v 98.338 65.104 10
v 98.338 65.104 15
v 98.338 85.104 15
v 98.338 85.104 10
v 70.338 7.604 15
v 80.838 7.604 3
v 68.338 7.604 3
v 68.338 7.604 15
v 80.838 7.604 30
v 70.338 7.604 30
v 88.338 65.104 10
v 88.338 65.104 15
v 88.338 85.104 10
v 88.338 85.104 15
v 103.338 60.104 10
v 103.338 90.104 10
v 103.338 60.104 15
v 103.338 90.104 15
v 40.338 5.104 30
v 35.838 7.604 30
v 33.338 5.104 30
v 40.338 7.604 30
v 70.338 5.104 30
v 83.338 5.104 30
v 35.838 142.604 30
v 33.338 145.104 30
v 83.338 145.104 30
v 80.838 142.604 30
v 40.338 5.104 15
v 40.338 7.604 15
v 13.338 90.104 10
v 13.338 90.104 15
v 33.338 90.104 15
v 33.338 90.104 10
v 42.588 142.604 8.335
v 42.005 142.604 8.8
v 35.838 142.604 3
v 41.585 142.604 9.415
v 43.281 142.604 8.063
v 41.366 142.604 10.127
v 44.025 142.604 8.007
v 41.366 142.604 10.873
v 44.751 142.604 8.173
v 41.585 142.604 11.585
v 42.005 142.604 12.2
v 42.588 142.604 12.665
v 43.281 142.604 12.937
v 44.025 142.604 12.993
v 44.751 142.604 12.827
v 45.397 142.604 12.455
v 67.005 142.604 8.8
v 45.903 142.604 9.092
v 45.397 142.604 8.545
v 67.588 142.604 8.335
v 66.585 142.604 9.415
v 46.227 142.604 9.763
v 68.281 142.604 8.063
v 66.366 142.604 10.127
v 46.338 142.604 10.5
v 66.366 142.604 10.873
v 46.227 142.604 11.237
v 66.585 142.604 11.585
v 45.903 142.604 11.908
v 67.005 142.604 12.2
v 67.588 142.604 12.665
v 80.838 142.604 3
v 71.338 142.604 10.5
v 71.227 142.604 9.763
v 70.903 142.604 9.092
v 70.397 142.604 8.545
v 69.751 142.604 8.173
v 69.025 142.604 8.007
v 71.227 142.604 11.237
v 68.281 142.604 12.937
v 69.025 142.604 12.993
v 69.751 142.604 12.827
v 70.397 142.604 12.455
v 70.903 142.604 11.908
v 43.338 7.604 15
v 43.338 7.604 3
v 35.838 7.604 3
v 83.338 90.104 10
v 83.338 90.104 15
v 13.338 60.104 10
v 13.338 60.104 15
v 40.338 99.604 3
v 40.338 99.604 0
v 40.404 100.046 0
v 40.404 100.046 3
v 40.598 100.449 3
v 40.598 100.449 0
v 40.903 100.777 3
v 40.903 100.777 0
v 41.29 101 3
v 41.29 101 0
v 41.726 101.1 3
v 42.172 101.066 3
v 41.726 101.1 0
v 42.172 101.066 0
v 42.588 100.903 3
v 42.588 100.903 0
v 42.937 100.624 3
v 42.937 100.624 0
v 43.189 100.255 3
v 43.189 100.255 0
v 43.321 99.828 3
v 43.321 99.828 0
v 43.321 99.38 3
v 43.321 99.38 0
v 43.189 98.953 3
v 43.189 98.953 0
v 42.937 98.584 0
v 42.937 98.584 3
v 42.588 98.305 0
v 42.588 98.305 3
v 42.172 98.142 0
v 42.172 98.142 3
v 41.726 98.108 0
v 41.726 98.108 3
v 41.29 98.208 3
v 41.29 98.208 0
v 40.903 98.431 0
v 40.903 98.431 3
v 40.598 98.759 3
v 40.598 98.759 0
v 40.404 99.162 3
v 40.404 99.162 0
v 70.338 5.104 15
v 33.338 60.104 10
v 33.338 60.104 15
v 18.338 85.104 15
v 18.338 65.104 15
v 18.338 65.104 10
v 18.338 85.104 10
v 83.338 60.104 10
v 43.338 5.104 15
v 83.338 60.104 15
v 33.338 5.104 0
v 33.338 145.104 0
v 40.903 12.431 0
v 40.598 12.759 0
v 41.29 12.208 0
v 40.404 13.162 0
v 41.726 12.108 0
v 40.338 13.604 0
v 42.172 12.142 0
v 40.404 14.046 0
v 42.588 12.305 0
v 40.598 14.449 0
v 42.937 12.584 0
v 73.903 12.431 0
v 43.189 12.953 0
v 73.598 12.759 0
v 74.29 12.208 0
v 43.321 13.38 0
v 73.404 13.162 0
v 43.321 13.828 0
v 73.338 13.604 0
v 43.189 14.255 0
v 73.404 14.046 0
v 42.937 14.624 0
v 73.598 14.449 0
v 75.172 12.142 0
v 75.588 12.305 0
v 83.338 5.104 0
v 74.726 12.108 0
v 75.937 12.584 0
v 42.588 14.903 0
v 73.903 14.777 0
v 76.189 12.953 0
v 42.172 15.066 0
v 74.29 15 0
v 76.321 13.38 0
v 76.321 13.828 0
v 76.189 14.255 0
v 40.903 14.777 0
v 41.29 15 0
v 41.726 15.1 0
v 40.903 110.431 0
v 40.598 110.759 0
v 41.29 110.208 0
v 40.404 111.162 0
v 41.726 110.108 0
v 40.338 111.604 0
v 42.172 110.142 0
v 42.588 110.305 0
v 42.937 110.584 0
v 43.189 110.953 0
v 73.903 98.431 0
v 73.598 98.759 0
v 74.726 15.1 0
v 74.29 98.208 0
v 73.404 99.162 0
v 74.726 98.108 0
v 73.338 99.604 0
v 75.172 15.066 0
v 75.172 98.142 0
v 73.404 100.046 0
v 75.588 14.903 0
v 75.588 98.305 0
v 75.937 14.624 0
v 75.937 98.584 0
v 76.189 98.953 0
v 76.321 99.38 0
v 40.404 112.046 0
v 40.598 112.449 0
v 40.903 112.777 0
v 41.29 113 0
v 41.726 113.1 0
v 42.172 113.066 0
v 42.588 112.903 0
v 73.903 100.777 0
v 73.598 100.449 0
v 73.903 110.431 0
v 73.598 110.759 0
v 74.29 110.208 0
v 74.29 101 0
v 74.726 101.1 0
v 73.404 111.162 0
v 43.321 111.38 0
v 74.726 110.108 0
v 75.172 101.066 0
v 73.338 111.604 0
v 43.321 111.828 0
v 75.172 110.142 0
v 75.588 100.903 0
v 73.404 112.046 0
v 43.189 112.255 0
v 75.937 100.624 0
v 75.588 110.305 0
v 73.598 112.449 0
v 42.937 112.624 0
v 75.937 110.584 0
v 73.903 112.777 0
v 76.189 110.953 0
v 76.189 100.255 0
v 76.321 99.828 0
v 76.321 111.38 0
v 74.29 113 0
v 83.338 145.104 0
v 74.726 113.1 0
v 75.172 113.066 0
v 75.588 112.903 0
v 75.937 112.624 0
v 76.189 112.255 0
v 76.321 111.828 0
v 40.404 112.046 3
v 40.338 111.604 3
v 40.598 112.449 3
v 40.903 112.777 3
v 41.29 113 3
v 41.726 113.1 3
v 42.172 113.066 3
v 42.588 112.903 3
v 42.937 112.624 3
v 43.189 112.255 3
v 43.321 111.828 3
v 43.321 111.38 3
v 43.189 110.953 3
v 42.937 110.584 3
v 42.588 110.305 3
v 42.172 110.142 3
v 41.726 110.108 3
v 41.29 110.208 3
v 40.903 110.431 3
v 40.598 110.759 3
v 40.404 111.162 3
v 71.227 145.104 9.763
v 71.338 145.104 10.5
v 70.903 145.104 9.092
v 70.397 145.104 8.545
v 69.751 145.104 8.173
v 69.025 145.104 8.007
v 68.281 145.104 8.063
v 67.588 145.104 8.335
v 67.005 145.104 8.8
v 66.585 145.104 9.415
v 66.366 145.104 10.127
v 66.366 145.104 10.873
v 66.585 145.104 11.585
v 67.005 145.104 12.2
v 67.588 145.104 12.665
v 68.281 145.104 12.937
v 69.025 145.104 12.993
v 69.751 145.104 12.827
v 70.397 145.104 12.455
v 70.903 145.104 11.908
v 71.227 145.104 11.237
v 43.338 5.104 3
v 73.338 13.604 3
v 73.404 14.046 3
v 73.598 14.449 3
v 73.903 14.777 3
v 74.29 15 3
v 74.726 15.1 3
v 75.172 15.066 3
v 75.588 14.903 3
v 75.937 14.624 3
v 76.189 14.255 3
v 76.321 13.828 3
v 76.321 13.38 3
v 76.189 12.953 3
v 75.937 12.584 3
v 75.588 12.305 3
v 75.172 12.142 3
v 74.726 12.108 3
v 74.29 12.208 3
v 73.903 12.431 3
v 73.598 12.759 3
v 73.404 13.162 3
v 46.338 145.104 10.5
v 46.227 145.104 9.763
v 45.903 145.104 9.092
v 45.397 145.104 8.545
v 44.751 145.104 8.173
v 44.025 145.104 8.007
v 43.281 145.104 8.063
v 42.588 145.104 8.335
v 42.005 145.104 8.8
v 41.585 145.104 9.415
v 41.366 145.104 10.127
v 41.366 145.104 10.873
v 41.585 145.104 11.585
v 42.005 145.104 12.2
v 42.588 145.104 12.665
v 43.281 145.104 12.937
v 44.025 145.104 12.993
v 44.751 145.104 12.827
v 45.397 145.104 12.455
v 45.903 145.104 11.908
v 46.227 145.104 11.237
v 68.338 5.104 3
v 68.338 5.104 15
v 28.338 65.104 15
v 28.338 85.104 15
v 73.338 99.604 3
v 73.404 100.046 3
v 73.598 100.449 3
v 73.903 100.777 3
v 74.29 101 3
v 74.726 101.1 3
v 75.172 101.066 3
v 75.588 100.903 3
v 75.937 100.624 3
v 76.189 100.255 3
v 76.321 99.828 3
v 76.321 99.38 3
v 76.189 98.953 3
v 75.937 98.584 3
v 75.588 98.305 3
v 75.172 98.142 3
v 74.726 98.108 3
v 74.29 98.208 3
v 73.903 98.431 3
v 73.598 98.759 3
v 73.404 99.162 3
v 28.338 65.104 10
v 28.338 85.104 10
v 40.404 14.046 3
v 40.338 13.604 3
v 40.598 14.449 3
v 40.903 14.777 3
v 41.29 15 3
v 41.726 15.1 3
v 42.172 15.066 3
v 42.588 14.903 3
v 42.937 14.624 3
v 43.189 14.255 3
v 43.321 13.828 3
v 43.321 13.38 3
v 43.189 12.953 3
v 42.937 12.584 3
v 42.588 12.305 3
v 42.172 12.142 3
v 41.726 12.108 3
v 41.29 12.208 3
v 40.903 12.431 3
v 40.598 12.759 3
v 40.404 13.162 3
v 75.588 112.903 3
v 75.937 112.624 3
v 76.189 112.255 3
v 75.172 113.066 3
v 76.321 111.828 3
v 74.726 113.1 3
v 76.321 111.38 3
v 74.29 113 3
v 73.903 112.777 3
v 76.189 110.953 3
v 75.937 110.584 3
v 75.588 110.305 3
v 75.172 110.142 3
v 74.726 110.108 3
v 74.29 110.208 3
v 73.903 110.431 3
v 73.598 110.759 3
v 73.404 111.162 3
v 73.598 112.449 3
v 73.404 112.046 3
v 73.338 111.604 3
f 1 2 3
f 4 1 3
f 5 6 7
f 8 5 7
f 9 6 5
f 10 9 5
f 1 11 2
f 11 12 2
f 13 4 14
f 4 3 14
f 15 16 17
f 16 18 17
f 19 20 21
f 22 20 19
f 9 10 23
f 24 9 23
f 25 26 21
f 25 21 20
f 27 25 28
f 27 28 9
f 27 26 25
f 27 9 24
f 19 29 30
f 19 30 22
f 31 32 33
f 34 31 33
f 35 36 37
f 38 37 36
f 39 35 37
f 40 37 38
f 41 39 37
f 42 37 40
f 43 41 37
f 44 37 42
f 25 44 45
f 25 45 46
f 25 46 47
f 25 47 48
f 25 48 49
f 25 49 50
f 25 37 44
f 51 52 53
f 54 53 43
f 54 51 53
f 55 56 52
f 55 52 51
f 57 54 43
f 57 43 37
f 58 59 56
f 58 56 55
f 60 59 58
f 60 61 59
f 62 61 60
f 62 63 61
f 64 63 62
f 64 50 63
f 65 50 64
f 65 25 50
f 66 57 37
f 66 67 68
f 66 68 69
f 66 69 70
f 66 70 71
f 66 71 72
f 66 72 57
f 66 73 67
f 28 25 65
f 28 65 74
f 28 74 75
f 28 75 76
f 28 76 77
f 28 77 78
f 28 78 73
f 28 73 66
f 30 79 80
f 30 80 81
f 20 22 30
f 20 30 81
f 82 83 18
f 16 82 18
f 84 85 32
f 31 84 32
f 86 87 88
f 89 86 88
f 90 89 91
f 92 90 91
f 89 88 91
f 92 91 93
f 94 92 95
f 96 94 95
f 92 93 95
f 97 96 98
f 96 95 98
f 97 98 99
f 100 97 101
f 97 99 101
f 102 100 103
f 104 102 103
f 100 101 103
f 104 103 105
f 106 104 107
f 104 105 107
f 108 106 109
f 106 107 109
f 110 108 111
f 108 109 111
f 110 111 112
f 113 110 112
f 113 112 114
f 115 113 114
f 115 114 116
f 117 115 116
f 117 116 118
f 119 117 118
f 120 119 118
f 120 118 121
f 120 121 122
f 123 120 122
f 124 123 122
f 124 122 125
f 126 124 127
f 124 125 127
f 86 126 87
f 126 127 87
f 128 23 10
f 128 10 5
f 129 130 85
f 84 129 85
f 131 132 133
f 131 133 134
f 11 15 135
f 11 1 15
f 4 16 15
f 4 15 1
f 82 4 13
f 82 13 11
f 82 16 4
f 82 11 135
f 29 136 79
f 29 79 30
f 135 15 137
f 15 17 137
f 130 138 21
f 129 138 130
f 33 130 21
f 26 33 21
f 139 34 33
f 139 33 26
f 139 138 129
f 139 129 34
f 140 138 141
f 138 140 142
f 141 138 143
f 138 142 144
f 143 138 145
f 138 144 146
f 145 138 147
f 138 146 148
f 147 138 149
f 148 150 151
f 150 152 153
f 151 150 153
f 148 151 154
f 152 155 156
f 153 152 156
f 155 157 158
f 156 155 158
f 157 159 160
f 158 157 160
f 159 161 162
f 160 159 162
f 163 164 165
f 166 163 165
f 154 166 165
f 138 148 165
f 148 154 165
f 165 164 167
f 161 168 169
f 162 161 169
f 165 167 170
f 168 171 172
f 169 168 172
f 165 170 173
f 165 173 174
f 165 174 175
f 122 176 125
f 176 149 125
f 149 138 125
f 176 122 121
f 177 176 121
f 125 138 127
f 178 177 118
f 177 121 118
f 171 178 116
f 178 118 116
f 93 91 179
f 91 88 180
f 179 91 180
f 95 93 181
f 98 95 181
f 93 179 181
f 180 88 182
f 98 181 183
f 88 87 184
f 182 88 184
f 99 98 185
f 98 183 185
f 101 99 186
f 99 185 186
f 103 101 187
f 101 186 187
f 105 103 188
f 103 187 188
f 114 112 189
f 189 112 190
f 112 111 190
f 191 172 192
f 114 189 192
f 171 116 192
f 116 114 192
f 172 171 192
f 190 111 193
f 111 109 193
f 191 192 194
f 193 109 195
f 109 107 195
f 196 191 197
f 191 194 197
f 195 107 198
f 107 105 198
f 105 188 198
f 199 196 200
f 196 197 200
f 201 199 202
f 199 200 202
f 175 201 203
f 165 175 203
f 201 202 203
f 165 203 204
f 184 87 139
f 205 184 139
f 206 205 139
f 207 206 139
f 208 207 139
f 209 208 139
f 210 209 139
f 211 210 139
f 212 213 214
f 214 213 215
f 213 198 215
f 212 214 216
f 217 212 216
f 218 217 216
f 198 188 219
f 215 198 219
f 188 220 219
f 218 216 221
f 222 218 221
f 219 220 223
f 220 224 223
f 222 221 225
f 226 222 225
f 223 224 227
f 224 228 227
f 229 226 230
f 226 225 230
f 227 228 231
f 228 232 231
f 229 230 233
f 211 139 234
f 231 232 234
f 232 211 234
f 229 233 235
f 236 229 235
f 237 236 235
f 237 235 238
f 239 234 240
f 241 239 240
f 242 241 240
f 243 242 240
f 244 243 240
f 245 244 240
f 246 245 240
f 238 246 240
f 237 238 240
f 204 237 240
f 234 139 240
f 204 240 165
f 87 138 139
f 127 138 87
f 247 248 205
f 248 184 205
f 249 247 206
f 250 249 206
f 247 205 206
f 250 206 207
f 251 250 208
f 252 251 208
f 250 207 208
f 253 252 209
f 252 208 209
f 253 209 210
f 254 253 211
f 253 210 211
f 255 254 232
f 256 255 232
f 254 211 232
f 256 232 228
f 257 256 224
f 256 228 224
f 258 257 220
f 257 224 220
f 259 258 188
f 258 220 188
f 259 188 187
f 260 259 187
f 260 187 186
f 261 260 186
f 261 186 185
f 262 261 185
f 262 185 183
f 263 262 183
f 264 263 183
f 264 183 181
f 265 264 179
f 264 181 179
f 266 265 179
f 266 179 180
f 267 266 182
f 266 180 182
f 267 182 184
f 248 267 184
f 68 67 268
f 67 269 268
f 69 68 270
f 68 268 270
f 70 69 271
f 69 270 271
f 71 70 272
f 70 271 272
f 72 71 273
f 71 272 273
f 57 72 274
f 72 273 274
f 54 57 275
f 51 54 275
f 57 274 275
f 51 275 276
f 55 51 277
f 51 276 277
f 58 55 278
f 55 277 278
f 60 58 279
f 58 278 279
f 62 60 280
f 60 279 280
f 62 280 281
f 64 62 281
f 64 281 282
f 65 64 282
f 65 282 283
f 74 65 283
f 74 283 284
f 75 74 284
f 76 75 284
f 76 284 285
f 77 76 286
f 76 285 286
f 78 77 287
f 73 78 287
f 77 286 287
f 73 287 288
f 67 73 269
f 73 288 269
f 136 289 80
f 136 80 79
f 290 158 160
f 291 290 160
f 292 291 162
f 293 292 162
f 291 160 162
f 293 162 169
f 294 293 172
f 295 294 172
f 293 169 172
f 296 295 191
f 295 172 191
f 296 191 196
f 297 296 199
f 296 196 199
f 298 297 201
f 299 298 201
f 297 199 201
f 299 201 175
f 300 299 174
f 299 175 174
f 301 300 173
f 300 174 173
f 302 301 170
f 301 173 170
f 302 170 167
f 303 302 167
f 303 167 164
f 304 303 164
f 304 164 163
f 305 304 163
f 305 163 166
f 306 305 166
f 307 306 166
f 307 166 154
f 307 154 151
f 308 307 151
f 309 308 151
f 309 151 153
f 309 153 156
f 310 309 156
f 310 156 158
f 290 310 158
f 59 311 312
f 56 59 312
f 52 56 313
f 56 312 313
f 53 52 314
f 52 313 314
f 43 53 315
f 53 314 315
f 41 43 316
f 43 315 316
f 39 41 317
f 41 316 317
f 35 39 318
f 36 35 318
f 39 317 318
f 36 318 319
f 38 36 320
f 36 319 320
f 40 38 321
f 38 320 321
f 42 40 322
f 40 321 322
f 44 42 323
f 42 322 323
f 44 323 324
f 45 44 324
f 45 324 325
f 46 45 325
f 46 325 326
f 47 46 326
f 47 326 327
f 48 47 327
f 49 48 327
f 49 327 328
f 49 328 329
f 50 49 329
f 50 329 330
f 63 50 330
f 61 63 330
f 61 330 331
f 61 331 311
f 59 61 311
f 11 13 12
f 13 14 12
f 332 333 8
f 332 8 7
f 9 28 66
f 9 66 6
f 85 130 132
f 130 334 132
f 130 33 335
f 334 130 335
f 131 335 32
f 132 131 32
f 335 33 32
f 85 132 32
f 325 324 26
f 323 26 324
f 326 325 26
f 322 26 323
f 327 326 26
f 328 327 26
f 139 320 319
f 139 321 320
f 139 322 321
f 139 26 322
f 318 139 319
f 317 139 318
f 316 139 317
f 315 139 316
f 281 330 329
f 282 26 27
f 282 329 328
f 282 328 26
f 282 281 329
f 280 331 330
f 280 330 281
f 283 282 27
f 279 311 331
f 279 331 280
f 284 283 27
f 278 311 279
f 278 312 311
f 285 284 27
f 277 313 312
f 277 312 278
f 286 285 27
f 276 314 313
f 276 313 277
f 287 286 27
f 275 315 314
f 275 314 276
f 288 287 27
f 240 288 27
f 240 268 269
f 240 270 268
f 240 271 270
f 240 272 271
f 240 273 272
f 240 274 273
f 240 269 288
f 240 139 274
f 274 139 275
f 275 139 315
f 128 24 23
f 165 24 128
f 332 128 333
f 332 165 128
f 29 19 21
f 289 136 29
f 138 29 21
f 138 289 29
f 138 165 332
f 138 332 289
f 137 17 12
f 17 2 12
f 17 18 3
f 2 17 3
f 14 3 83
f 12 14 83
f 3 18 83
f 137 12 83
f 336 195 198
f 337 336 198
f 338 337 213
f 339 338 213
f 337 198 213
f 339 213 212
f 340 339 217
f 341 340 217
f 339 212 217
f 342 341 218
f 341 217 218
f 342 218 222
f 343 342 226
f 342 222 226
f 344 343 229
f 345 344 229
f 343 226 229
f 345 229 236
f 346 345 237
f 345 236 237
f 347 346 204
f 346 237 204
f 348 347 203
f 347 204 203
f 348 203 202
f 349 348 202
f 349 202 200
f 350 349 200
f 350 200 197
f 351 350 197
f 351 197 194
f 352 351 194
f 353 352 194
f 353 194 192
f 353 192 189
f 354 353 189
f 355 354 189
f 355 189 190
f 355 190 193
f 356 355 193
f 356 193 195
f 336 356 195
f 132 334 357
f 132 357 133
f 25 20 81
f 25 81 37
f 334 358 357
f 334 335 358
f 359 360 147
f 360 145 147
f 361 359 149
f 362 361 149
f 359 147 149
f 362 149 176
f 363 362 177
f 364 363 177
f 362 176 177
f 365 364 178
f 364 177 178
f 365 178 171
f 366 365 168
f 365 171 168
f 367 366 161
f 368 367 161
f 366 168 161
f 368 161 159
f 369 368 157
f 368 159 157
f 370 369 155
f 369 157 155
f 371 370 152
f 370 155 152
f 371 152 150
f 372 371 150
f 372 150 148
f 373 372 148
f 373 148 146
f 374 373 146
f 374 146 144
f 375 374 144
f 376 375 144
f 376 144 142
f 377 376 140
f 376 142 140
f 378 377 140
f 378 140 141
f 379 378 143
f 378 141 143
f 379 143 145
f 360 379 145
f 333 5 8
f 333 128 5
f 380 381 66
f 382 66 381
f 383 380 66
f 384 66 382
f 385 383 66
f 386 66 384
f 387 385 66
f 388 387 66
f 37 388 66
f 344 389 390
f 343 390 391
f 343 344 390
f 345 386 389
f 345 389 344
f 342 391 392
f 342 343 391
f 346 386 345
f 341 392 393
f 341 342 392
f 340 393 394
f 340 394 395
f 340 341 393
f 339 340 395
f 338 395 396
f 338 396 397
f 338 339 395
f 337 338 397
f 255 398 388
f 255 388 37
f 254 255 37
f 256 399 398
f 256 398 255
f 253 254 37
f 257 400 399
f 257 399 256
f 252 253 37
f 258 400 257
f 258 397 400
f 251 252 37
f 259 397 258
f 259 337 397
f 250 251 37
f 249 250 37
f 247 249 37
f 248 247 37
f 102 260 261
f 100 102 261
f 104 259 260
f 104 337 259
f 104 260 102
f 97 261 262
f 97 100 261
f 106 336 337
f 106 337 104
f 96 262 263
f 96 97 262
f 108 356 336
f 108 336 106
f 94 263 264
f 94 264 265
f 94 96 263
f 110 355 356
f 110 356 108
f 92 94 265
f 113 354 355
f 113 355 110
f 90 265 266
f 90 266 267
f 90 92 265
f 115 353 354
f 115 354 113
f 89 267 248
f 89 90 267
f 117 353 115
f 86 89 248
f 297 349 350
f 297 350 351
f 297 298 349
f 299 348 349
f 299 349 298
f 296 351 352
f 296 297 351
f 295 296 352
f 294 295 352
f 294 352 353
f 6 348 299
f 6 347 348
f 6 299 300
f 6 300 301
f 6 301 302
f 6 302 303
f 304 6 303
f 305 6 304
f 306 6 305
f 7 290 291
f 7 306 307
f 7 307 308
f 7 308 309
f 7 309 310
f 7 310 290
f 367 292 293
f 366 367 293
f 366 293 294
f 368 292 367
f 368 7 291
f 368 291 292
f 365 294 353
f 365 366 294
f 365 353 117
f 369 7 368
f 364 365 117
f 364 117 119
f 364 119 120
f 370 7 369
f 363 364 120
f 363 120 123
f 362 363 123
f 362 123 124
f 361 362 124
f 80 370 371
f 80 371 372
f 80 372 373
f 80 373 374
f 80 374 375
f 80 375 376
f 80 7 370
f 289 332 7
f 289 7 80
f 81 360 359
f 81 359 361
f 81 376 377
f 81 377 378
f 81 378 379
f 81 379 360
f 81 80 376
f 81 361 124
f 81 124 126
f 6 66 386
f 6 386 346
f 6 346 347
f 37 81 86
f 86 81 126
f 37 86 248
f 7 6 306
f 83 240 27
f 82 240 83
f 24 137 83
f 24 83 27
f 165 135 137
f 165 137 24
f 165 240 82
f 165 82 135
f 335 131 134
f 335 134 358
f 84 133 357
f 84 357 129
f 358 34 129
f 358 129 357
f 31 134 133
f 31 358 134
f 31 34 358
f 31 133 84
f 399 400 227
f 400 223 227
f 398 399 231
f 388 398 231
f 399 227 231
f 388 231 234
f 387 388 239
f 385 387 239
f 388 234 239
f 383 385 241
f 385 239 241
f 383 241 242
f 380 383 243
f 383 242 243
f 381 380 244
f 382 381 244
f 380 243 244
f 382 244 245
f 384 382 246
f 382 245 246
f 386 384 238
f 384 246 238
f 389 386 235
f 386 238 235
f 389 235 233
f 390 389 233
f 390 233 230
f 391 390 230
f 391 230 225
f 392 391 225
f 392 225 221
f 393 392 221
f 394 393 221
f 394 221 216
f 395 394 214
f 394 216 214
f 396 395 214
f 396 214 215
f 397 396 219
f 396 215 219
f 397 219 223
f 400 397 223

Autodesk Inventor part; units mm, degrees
ref_plane "YZ Plane" through (0, 0, 0) normal (1, 0, 0) x (0, 1, 0)
ref_plane "XZ Plane" through (0, 0, 0) normal (0, 1, 0) x (-1, 0, 0)
sketch "Sketch1" plane through (0, 0, 0) normal (0, 0, 1) x (1, 0, 0)
  line L0 (33.3378, 145.104) -> (83.3378, 145.104)
  line L1 (83.3378, 145.104) -> (83.3378, 5.104)
  line L2 (83.3378, 5.104) -> (33.3378, 5.104)
  line L3 (33.3378, 5.104) -> (33.3378, 145.104)
  line L4 (33.3378, 90.104) -> (33.3378, 60.104)
  line L5 (83.3378, 90.104) -> (83.3378, 60.104)
  point P0 (0, 0)
  dimension "d0" = 140
  dimension "d1" = 50
extrude "Extrusion1" add sketch "Sketch1" along normal blind 30
sketch "Sketch2" plane through (0, 0, 30) normal (0, 0, 1) x (1, 0, 0)
  line L0 (35.8378, 142.604) -> (80.8378, 142.604)
  line L1 (80.8378, 142.604) -> (80.8378, 7.604)
  line L2 (80.8378, 7.604) -> (35.8378, 7.604)
  line L3 (35.8378, 7.604) -> (35.8378, 142.604)
  line L4 (83.3378, 145.104) -> (33.3378, 145.104) projected
  line L5 (83.3378, 5.104) -> (83.3378, 145.104) projected
  line L6 (33.3378, 5.104) -> (83.3378, 5.104) projected
  line L7 (33.3378, 145.104) -> (33.3378, 5.104) projected
  point P0 (0, 0)
  point P1 (58.3378, 142.604)
  dimension "d4" = 2.5
  dimension "d5" = 2.5
  dimension "d6" = 2.5
  dimension "d7" = 2.5
extrude "Extrusion2" cut sketch "Sketch2" against normal blind 27 contours L0 L1 L2 L3
sketch "Sketch3" plane through (33.3378, 5.104, 0) normal (0, -1, 0) x (1, 0, 0)
  line L0 (7, 30) -> (37, 30)
  line L1 (37, 30) -> (37, 15)
  line L2 (37, 15) -> (7, 15)
  line L3 (7, 15) -> (7, 30)
  line L4 (0, 0) -> (50, 0) projected
  line L5 (0, 0) -> (0, 30) projected
  line L6 (0, 30) -> (50, 30) projected
  line L7 (10, 15) -> (35, 15)
  line L8 (35, 15) -> (35, 3)
  line L9 (35, 3) -> (10, 3)
  line L10 (10, 3) -> (10, 15)
  point P0 (-33.3378, 0)
  point P1 (37, 22.5)
  point P2 (10, 9)
  dimension "d10" = 15
  dimension "d11" = 30
  dimension "d12" = 7
  dimension "d13" = 0
  dimension "d14" = 25
  dimension "d15" = 10
  dimension "d16" = 3
extrude "Extrusion3" cut sketch "Sketch3" against normal blind 27
sketch "Sketch4" plane through (0, 0, 0) normal (0, 0, -1) x (-1, 0, 0)
  circle A0 centre (-74.8378, 13.604) radius 1.5
  circle A1 centre (-41.8378, 13.604) radius 1.5
  circle A2 centre (-41.8378, 99.604) radius 1.5
  circle A3 centre (-74.8378, 99.604) radius 1.5
  circle A4 centre (-41.8378, 111.604) radius 1.5
  circle A5 centre (-74.8378, 111.604) radius 1.5
  line L0 (-83.3378, 5.104) -> (-83.3378, 145.104) projected
  line L1 (-33.3378, 145.104) -> (-33.3378, 5.104) projected
  line L2 (-33.3378, 5.104) -> (-83.3378, 5.104) projected
  line L3 (-83.3378, 145.104) -> (-33.3378, 145.104) projected
  point P0 (0, 0)
  dimension "d19" = 8.5
  dimension "d20" = 8.5
  dimension "d21" = 8.5
  dimension "d22" = 8.5
  dimension "d23" = 3
  dimension "d24" = 3
  dimension "d25" = 8.5
  dimension "d26" = 8.5
  dimension "d27" = 8.5
  dimension "d28" = 8.5
  dimension "d29" = 3
  dimension "d30" = 3
  dimension "d31" = 3
  dimension "d32" = 3
  dimension "d33" = 12
  dimension "d34" = 12
  dimension "d35" = 33.5
  dimension "d36" = 33.5
extrude "Extrusion4" cut sketch "Sketch4" against normal blind 27 contours A0 | A1 | A2 | A3 | A4 | A5
sketch "Sketch5" plane through (33.3378, 145.104, 0) normal (0, 1, 0) x (1, 0, 0)
  circle A0 centre (35.5, -10.5) radius 2.5
  circle A1 centre (10.5, -10.5) radius 2.5
  line L0 (50, 0) -> (50, -30) projected
  line L1 (50, 0) -> (0, 0) projected
  point P0 (-33.3378, 0)
  dimension "d39" = 5
  dimension "d40" = 5
  dimension "d41" = 25
  dimension "d42" = 14.5
  dimension "d43" = 10.5
  dimension "d44" = 10.5
extrude "Extrusion5" cut sketch "Sketch5" against normal blind 27
sketch "Sketch6" plane through (33.3378, 5.104, 0) normal (0, -1, 0) x (1, 0, 0)
  point P0 (-33.3378, 0)
ref_plane "Work Plane1" through (0, 0, 12.5) normal (0, 0, -1) x (-1, 0, 0)
sketch "Sketch7" plane through (0, 0, 12.5) normal (0, 0, -1) x (-1, 0, 0)
  line L0 (-83.3378, 5.104) -> (-83.3378, 145.104) projected
  line L1 (-83.3378, 90.104) -> (-103.3378, 90.104)
  line L2 (-103.3378, 90.104) -> (-103.3378, 60.104)
  line L3 (-103.3378, 60.104) -> (-83.3378, 60.104)
  line L4 (-83.3378, 60.104) -> (-83.3378, 90.104)
  line L5 (-83.3378, 145.104) -> (-33.3378, 145.104) projected
  line L6 (-88.3378, 65.104) -> (-98.3378, 65.104)
  line L7 (-98.3378, 65.104) -> (-98.3378, 85.104)
  line L8 (-98.3378, 85.104) -> (-88.3378, 85.104)
  line L9 (-88.3378, 85.104) -> (-88.3378, 65.104)
  line L10 (-33.3378, 145.104) -> (-33.3378, 5.104) projected
  line L11 (-13.3378, 90.104) -> (-33.3378, 90.104)
  line L12 (-33.3378, 90.104) -> (-33.3378, 60.104)
  line L13 (-33.3378, 60.104) -> (-13.3378, 60.104)
  line L14 (-13.3378, 60.104) -> (-13.3378, 90.104)
  line L15 (-18.3378, 85.104) -> (-28.3378, 85.104)
  line L16 (-28.3378, 85.104) -> (-28.3378, 65.104)
  line L17 (-28.3378, 65.104) -> (-18.3378, 65.104)
  line L18 (-18.3378, 65.104) -> (-18.3378, 85.104)
  point P0 (0, 0)
  point P1 (-93.3378, 60.104)
  dimension "d56" = 20
  dimension "d57" = 30
  dimension "d58" = 55
  dimension "d59" = 5
  dimension "d60" = 20
  dimension "d61" = 30
  dimension "d62" = 55
  dimension "d63" = 5
extrude "Extrusion6" add sketch "Sketch7" along normal mid plane 5
properties part number "arduino mould_3r"
